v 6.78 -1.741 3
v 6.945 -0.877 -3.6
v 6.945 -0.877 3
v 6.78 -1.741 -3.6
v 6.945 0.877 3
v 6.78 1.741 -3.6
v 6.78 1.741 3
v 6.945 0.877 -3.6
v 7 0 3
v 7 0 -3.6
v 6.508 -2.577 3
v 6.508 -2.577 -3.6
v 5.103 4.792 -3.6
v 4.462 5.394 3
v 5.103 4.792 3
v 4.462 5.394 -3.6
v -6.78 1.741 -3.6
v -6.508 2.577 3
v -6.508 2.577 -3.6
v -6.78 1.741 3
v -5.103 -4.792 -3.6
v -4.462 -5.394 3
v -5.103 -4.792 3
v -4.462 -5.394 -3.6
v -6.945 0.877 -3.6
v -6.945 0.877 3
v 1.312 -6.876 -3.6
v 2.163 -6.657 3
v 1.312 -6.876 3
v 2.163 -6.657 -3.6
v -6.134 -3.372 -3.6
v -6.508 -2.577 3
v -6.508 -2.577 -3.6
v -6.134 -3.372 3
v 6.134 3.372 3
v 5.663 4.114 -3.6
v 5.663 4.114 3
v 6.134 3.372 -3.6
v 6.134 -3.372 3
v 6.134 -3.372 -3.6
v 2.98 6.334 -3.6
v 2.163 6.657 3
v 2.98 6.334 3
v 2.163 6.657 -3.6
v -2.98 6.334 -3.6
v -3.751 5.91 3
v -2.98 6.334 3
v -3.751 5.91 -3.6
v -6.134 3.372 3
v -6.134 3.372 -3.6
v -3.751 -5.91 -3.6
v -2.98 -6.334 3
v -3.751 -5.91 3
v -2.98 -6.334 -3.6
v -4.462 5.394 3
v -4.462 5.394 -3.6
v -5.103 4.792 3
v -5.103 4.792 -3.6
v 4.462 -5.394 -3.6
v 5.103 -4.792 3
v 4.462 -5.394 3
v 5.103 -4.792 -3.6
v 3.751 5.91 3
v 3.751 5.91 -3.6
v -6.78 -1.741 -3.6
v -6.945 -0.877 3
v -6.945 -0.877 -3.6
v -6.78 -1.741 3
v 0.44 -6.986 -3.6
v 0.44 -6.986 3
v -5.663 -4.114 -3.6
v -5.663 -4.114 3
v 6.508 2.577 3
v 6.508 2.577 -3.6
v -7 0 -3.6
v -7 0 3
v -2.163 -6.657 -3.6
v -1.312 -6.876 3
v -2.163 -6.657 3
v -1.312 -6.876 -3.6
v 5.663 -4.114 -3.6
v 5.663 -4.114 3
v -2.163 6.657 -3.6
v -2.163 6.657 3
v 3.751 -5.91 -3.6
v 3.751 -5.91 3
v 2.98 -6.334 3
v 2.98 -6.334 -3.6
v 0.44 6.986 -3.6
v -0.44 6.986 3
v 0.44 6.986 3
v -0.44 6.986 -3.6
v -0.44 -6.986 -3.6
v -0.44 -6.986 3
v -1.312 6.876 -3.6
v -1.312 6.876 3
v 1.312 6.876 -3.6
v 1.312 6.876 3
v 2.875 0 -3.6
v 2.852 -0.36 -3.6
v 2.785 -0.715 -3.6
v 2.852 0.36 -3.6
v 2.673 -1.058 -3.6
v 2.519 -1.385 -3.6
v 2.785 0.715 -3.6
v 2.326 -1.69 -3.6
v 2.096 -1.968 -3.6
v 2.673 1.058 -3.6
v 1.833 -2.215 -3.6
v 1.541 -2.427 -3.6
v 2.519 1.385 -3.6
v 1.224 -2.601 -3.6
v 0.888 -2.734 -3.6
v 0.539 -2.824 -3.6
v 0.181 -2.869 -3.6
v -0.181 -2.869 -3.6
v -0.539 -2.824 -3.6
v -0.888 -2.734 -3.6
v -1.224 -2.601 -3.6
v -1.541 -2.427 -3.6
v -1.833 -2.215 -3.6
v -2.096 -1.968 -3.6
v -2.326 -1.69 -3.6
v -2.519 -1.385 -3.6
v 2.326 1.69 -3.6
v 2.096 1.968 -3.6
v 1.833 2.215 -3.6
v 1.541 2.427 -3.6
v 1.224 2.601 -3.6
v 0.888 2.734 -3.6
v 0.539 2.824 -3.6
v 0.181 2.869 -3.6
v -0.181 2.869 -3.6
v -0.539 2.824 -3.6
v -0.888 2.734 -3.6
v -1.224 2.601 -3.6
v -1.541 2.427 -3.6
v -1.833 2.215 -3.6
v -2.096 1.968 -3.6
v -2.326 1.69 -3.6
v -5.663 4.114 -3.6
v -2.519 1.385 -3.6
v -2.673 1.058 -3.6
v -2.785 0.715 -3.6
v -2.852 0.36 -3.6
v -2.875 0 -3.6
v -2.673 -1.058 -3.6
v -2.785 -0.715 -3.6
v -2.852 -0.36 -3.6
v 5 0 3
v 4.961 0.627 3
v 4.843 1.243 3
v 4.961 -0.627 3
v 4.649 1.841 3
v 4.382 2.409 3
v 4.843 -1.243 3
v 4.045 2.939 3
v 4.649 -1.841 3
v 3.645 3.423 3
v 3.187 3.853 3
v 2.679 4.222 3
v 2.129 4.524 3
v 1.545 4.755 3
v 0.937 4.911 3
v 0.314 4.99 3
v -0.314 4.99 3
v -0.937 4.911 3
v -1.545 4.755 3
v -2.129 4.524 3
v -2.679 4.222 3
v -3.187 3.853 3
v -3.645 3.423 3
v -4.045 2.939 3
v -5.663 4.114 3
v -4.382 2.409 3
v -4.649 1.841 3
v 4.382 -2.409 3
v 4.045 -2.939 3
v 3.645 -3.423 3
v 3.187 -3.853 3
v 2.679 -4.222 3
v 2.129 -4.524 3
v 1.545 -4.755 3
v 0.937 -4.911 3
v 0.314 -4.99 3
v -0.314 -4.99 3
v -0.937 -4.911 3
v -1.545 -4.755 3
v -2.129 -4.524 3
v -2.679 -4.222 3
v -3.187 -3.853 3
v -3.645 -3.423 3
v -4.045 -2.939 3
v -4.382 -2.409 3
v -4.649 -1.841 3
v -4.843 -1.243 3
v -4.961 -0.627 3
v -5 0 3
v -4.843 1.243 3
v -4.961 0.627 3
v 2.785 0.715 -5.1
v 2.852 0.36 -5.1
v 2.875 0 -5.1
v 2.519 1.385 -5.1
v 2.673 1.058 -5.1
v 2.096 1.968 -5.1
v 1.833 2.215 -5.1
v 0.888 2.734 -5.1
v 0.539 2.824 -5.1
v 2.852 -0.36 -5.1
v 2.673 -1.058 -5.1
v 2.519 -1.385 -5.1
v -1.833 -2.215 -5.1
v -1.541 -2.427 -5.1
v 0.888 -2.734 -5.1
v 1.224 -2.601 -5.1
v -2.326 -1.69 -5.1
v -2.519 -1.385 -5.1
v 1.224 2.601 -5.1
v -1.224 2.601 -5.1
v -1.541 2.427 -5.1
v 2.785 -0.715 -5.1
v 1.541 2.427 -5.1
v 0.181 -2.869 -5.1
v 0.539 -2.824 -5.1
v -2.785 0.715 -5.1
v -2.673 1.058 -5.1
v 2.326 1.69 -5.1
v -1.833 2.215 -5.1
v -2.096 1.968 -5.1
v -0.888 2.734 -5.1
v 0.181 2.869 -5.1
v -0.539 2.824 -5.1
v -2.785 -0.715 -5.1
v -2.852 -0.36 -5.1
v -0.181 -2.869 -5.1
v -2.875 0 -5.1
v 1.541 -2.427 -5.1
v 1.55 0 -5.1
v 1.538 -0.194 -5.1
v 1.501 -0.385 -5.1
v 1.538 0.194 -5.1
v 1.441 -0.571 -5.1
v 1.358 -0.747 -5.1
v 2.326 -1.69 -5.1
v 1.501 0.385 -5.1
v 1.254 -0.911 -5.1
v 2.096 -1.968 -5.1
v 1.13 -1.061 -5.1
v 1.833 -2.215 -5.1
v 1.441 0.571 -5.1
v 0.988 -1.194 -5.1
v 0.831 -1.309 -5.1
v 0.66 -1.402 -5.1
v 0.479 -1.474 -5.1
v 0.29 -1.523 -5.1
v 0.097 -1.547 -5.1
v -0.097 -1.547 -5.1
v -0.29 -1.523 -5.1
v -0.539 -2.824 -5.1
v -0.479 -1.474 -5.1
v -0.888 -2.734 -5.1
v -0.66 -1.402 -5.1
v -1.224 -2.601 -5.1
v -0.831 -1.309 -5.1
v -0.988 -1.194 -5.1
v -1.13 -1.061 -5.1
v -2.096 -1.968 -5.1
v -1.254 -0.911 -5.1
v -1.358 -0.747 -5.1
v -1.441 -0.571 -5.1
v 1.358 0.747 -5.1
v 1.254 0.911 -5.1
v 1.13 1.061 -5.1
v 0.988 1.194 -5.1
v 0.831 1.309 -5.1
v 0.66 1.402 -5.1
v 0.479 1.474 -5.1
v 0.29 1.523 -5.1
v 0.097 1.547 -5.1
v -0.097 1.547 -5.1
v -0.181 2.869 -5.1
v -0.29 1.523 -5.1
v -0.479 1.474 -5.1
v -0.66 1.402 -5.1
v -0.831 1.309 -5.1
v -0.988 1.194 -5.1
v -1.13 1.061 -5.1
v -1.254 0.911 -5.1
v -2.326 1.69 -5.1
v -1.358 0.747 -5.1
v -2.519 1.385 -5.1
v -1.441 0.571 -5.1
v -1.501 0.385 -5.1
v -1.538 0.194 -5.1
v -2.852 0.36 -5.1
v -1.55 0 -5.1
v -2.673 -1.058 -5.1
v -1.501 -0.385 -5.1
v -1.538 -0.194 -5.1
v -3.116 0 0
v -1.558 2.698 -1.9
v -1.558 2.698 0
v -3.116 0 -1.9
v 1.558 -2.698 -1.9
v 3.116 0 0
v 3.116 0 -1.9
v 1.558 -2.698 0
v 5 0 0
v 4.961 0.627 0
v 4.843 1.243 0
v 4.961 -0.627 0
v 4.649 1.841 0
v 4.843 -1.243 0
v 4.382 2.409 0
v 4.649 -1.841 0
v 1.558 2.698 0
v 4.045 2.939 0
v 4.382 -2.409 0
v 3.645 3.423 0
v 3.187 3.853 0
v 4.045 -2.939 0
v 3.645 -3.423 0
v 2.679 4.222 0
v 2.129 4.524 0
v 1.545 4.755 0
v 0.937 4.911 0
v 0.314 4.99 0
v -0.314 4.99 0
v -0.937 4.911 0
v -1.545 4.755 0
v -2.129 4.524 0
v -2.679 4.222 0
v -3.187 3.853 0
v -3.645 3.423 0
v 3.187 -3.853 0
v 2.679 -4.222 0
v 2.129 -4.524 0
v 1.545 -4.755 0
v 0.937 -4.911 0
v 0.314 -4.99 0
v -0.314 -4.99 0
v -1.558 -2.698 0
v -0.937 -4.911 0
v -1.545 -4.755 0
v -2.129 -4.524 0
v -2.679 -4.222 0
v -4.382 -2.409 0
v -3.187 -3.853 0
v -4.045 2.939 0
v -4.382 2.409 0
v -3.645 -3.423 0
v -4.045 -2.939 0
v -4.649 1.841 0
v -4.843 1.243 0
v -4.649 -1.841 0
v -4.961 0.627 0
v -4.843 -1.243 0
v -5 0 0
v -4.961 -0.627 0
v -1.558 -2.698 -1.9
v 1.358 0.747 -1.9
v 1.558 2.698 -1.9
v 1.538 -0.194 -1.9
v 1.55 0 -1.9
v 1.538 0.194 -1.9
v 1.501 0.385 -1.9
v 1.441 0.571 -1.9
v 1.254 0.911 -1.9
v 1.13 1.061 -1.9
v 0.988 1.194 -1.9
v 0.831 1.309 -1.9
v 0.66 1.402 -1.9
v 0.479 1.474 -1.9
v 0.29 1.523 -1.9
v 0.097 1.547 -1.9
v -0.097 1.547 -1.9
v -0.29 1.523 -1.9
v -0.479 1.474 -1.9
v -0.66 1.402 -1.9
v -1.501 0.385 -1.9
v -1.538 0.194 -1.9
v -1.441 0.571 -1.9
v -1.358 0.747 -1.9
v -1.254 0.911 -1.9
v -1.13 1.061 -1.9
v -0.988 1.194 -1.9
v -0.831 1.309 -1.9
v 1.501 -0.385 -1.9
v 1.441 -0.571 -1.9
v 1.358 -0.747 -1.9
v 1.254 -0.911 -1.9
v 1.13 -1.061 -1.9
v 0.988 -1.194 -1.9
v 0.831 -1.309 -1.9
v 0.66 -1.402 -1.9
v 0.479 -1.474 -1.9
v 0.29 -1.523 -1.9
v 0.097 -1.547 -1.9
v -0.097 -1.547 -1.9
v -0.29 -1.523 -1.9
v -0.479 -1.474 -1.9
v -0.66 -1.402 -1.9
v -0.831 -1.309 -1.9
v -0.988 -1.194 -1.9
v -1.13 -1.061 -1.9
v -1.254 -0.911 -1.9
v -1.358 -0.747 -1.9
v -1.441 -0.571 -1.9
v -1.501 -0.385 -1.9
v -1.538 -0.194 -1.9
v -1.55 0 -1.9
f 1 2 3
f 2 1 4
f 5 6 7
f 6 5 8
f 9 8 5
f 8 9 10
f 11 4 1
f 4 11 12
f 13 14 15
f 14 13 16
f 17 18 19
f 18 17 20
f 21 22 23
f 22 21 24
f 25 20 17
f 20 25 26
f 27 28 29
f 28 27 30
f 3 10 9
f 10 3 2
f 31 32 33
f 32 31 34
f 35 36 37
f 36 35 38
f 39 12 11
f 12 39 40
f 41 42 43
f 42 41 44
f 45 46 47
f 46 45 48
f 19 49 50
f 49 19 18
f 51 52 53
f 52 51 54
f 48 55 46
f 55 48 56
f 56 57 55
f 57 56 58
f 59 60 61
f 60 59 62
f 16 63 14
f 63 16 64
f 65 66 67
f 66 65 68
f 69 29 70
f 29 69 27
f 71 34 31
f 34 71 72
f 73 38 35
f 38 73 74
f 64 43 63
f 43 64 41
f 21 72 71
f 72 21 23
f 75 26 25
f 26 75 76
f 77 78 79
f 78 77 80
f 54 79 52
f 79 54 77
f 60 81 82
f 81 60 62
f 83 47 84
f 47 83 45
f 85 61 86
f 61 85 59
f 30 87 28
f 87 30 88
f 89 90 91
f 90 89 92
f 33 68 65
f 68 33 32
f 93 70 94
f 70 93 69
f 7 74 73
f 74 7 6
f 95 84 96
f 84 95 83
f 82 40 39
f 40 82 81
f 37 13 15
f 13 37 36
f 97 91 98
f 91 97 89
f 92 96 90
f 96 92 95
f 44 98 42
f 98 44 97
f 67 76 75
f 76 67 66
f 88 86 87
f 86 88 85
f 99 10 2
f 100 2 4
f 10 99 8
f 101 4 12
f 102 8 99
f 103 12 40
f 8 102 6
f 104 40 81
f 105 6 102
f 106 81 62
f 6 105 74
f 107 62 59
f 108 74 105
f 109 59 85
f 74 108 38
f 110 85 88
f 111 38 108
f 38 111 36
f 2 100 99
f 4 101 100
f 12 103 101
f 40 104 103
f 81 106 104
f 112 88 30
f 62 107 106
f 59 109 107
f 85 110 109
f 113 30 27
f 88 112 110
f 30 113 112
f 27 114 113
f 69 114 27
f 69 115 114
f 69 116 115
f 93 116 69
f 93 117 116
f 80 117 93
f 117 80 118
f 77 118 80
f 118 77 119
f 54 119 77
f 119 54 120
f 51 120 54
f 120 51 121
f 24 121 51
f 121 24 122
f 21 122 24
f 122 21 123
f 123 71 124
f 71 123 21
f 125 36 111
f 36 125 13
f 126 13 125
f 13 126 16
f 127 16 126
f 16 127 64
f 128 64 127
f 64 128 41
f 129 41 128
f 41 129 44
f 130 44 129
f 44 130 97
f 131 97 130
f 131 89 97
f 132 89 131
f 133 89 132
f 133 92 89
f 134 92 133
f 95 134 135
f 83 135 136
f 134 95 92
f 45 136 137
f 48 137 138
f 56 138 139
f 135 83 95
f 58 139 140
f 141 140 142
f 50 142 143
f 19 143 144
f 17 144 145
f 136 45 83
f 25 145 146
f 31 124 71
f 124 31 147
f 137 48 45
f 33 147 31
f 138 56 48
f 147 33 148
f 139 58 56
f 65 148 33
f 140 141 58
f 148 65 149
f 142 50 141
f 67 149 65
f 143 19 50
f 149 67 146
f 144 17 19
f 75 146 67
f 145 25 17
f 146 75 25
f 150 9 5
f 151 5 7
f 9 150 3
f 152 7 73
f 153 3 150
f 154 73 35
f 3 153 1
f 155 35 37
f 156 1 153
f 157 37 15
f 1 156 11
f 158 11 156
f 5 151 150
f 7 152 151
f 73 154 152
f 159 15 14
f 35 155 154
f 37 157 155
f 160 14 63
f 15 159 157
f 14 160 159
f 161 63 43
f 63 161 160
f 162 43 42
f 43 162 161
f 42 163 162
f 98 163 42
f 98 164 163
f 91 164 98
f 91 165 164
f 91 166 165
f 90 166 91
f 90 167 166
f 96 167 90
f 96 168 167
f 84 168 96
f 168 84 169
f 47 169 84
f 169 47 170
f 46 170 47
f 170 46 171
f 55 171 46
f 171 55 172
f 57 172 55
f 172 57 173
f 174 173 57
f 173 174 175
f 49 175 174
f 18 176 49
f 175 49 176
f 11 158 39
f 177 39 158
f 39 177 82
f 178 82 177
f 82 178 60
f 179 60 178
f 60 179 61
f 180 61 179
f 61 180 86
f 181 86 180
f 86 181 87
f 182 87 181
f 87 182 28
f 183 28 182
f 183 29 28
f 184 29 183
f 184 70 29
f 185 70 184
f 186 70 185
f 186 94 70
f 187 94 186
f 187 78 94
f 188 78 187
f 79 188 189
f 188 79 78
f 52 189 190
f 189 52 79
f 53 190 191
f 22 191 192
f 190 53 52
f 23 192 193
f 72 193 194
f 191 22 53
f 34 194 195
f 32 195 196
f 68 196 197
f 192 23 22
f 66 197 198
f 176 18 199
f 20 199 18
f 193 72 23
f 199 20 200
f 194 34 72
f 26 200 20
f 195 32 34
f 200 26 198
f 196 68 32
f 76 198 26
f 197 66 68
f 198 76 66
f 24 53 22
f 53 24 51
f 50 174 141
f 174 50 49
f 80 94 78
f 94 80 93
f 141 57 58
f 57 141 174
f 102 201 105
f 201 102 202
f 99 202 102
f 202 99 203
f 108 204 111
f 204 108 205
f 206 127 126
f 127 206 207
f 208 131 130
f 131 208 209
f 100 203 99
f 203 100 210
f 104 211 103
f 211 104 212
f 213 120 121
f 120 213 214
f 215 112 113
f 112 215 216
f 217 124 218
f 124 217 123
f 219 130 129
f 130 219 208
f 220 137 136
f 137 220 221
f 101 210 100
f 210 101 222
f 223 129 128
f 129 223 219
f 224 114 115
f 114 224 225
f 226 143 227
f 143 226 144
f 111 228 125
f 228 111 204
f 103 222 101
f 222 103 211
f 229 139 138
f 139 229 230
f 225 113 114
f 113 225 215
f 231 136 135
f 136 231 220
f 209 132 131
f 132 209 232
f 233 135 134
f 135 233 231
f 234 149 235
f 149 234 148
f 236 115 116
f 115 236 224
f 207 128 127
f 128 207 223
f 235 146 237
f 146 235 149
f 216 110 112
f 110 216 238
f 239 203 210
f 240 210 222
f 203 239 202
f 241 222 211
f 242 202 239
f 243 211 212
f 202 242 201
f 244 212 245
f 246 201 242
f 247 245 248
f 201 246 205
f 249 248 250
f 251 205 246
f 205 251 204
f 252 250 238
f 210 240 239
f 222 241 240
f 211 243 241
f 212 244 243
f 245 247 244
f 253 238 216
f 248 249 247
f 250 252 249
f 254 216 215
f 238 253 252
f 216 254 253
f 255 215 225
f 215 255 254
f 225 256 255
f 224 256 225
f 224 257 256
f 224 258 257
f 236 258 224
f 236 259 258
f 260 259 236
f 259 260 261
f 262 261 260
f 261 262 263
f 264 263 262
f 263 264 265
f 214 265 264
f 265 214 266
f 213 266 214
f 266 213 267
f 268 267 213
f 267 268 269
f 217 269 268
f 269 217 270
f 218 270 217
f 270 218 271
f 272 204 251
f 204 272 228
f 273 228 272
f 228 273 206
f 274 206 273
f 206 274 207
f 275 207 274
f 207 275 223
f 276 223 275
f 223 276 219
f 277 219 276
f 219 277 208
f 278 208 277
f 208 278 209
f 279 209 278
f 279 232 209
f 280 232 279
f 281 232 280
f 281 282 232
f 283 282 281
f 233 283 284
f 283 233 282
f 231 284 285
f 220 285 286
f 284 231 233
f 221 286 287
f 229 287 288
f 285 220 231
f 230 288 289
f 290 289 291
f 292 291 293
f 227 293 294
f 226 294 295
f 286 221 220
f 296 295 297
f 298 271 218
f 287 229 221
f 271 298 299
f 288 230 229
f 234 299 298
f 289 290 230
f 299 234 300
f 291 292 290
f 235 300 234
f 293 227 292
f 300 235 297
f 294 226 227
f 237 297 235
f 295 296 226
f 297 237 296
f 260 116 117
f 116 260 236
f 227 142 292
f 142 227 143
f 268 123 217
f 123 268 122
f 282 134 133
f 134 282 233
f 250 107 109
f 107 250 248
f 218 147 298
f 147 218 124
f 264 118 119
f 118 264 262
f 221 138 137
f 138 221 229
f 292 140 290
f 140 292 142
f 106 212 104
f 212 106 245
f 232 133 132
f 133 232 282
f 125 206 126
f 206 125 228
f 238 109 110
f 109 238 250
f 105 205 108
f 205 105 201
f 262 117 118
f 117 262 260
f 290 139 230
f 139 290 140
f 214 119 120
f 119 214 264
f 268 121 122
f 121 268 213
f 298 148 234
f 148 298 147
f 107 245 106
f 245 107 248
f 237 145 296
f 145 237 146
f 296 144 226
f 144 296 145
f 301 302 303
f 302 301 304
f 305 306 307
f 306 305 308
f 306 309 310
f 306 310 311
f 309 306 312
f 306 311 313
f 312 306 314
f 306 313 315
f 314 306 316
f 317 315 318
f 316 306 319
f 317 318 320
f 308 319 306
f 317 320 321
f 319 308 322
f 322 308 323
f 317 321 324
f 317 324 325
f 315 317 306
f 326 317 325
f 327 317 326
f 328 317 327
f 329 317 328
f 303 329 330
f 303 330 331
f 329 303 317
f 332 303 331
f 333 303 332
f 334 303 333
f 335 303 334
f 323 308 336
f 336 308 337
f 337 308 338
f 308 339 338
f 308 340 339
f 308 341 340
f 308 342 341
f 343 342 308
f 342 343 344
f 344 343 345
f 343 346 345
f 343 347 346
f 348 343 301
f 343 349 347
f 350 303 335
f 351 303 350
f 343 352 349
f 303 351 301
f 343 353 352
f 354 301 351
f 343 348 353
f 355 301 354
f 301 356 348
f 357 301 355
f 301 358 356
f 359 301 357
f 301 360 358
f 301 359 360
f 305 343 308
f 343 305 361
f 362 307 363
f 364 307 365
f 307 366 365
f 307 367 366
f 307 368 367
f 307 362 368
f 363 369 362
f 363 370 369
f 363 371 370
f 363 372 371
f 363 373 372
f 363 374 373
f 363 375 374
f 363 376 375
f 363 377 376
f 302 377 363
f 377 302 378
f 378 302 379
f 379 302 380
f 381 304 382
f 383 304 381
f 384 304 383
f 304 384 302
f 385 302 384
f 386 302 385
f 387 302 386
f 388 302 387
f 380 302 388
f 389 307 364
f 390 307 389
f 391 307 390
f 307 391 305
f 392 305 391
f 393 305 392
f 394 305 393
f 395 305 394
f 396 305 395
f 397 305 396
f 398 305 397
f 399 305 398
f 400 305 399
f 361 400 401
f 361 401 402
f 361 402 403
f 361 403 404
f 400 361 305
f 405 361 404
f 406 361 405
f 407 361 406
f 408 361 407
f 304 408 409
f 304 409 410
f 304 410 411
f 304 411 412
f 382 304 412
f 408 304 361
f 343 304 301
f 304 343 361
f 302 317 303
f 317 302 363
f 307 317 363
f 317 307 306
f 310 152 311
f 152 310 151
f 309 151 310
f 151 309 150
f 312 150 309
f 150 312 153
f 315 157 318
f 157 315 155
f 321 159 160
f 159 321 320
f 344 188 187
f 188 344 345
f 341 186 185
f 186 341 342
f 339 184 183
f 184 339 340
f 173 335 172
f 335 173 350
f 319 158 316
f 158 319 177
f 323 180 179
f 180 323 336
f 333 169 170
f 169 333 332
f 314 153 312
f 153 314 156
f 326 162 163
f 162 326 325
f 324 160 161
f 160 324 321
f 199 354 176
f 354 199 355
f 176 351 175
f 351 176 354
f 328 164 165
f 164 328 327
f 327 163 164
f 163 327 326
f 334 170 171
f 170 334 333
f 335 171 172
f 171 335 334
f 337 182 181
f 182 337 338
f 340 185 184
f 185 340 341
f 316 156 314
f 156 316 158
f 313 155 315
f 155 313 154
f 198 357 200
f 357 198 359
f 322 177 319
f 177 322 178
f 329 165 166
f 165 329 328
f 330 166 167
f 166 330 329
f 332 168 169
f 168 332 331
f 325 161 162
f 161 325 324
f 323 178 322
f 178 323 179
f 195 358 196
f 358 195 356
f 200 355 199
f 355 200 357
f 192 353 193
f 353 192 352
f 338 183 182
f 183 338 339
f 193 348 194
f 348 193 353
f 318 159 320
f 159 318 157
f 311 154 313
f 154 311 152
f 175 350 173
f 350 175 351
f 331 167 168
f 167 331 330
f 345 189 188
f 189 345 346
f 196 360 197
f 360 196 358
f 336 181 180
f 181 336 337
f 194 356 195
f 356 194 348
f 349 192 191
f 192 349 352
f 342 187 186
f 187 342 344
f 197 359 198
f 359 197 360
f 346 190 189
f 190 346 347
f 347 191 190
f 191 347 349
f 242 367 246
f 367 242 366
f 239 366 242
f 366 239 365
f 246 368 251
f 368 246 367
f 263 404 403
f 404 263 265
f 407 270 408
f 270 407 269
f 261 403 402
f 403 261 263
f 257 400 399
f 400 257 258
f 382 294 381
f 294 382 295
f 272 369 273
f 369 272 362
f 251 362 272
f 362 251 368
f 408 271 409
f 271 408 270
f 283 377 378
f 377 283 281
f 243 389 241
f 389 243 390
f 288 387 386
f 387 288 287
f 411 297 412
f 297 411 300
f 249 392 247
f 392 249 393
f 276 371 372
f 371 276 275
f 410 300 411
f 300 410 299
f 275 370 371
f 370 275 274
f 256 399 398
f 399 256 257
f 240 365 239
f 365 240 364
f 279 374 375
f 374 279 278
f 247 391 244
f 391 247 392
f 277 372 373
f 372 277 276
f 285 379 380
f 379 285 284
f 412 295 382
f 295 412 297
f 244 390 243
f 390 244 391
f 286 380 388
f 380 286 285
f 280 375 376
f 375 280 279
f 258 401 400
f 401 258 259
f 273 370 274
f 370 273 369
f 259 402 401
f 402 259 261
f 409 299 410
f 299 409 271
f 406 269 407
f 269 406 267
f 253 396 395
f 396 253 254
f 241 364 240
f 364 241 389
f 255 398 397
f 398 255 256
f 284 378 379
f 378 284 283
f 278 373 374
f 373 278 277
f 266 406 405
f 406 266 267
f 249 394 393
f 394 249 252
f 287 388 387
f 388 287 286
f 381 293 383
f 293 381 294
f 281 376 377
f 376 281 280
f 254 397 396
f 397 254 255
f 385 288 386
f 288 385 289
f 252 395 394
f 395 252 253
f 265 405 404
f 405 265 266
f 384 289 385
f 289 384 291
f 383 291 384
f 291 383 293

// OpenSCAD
$fn = 50;


difference() {
	union() {
		translate(v = [0, 0, -3.6000000000]) {
			cylinder(h = 6.6000000000, r = 7.0000000000);
		}
		#translate(v = [0, 0, -5.1000000000]) {
			cylinder(h = 5.1000000000, r = 2.8750000000);
		}
	}
	union() {
		translate(v = [0, 0, 0]) {
			rotate(a = [0, 0, 0]) {
				difference() {
					union() {
						translate(v = [0, 0, -1.9000000000]) {
							linear_extrude(height = 1.9000000000) {
								polygon(points = [[3.1158000000, 0.0000000000], [1.5579000000, 2.6983619531], [-1.5579000000, 2.6983619531], [-3.1158000000, 0.0000000000], [-1.5579000000, -2.6983619531], [1.5579000000, -2.6983619531]]);
							}
						}
					}
					union();
				}
			}
		}
		#cylinder(h = 3, r = 5.0000000000);
		#translate(v = [0, 0, -100.0000000000]) {
			cylinder(h = 200, r = 1.5500000000);
		}
	}
}
